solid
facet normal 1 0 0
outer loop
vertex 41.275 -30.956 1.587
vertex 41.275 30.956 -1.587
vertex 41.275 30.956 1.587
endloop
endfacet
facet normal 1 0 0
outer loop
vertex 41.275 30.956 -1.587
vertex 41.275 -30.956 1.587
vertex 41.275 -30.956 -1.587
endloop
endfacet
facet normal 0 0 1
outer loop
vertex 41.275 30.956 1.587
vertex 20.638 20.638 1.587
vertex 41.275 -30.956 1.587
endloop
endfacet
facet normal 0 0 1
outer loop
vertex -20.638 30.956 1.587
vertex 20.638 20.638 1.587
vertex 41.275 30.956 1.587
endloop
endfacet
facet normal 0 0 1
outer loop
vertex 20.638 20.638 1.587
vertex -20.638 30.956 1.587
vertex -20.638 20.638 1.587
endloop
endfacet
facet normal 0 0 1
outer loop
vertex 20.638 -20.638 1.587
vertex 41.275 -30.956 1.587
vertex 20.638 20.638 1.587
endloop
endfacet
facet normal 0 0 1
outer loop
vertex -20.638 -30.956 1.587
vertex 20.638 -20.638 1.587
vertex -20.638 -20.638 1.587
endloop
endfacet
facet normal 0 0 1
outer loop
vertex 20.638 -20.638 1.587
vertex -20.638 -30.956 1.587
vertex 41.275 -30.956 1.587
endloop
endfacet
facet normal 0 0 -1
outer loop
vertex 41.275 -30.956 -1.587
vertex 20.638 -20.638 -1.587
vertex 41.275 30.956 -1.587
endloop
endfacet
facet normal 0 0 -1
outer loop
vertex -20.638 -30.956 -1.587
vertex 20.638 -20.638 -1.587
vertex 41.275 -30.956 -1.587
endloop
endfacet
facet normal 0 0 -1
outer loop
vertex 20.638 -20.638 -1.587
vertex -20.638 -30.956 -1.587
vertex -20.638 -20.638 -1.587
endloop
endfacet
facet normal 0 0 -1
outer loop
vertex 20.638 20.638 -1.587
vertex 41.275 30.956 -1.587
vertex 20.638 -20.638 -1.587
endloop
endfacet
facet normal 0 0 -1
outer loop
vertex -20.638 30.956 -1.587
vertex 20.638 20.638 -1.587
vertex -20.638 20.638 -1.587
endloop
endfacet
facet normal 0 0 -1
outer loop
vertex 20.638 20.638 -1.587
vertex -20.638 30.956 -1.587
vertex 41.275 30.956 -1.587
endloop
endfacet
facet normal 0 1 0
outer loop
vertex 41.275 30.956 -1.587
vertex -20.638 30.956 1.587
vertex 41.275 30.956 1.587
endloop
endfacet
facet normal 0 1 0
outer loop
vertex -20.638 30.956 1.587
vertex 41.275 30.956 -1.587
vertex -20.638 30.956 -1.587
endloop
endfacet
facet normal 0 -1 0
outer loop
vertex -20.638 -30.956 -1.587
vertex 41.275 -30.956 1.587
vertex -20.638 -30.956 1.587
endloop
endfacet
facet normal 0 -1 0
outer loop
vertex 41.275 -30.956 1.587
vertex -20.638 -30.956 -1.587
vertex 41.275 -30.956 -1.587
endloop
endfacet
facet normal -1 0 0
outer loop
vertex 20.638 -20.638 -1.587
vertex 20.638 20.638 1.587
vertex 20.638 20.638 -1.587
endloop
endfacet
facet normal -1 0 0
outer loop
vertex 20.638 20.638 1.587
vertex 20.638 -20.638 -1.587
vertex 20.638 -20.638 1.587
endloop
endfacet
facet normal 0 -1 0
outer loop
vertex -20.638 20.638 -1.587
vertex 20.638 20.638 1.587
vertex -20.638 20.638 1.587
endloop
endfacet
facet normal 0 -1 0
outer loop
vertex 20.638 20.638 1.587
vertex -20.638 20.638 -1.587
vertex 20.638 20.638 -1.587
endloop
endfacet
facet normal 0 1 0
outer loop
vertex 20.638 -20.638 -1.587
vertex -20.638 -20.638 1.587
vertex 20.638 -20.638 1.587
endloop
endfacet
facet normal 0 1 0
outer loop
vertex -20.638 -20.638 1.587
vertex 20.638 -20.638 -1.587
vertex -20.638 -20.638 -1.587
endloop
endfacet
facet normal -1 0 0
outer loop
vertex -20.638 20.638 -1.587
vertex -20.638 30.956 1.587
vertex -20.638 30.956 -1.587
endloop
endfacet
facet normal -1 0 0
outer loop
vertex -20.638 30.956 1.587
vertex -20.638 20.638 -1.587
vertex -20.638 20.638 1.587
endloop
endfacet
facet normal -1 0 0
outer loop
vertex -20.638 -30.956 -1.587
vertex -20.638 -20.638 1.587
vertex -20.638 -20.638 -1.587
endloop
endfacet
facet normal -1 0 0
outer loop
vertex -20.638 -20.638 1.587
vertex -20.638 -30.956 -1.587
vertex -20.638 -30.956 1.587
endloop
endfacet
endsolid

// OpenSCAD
// What size you want to gauge to be for
t_size=1.625;


// Conversion Factor for Inches(25.4) or MM (1)
conversion = 25.4; // [25.4,1]


jaws= t_size * conversion;

height=(.125) * conversion;

top=jaws * .25;
side=jaws * .25; // .40

arm=side;



union() {
// If you want to see the cylinder
//cylinder(h=height,d=jaws,center=true);


// Handle
translate([((jaws/2)+side+top/2),0,0]) cube(size=[top, jaws+arm+side, height], center=true);


// Top bar
translate([(jaws/2)+(side/2),0,0]) cube(size=[side, jaws, height], center=true);

// Side Bar (Right)
translate([side-(arm/2),(((jaws/2))+(side/2))*1,0]) cube(size=[jaws+arm, side, height], center=true);
// Side Bar (Left)
translate([side-(arm/2),(((jaws/2))+(side/2))*-1,0]) cube(size=[jaws+arm, side, height], center=true);


};
